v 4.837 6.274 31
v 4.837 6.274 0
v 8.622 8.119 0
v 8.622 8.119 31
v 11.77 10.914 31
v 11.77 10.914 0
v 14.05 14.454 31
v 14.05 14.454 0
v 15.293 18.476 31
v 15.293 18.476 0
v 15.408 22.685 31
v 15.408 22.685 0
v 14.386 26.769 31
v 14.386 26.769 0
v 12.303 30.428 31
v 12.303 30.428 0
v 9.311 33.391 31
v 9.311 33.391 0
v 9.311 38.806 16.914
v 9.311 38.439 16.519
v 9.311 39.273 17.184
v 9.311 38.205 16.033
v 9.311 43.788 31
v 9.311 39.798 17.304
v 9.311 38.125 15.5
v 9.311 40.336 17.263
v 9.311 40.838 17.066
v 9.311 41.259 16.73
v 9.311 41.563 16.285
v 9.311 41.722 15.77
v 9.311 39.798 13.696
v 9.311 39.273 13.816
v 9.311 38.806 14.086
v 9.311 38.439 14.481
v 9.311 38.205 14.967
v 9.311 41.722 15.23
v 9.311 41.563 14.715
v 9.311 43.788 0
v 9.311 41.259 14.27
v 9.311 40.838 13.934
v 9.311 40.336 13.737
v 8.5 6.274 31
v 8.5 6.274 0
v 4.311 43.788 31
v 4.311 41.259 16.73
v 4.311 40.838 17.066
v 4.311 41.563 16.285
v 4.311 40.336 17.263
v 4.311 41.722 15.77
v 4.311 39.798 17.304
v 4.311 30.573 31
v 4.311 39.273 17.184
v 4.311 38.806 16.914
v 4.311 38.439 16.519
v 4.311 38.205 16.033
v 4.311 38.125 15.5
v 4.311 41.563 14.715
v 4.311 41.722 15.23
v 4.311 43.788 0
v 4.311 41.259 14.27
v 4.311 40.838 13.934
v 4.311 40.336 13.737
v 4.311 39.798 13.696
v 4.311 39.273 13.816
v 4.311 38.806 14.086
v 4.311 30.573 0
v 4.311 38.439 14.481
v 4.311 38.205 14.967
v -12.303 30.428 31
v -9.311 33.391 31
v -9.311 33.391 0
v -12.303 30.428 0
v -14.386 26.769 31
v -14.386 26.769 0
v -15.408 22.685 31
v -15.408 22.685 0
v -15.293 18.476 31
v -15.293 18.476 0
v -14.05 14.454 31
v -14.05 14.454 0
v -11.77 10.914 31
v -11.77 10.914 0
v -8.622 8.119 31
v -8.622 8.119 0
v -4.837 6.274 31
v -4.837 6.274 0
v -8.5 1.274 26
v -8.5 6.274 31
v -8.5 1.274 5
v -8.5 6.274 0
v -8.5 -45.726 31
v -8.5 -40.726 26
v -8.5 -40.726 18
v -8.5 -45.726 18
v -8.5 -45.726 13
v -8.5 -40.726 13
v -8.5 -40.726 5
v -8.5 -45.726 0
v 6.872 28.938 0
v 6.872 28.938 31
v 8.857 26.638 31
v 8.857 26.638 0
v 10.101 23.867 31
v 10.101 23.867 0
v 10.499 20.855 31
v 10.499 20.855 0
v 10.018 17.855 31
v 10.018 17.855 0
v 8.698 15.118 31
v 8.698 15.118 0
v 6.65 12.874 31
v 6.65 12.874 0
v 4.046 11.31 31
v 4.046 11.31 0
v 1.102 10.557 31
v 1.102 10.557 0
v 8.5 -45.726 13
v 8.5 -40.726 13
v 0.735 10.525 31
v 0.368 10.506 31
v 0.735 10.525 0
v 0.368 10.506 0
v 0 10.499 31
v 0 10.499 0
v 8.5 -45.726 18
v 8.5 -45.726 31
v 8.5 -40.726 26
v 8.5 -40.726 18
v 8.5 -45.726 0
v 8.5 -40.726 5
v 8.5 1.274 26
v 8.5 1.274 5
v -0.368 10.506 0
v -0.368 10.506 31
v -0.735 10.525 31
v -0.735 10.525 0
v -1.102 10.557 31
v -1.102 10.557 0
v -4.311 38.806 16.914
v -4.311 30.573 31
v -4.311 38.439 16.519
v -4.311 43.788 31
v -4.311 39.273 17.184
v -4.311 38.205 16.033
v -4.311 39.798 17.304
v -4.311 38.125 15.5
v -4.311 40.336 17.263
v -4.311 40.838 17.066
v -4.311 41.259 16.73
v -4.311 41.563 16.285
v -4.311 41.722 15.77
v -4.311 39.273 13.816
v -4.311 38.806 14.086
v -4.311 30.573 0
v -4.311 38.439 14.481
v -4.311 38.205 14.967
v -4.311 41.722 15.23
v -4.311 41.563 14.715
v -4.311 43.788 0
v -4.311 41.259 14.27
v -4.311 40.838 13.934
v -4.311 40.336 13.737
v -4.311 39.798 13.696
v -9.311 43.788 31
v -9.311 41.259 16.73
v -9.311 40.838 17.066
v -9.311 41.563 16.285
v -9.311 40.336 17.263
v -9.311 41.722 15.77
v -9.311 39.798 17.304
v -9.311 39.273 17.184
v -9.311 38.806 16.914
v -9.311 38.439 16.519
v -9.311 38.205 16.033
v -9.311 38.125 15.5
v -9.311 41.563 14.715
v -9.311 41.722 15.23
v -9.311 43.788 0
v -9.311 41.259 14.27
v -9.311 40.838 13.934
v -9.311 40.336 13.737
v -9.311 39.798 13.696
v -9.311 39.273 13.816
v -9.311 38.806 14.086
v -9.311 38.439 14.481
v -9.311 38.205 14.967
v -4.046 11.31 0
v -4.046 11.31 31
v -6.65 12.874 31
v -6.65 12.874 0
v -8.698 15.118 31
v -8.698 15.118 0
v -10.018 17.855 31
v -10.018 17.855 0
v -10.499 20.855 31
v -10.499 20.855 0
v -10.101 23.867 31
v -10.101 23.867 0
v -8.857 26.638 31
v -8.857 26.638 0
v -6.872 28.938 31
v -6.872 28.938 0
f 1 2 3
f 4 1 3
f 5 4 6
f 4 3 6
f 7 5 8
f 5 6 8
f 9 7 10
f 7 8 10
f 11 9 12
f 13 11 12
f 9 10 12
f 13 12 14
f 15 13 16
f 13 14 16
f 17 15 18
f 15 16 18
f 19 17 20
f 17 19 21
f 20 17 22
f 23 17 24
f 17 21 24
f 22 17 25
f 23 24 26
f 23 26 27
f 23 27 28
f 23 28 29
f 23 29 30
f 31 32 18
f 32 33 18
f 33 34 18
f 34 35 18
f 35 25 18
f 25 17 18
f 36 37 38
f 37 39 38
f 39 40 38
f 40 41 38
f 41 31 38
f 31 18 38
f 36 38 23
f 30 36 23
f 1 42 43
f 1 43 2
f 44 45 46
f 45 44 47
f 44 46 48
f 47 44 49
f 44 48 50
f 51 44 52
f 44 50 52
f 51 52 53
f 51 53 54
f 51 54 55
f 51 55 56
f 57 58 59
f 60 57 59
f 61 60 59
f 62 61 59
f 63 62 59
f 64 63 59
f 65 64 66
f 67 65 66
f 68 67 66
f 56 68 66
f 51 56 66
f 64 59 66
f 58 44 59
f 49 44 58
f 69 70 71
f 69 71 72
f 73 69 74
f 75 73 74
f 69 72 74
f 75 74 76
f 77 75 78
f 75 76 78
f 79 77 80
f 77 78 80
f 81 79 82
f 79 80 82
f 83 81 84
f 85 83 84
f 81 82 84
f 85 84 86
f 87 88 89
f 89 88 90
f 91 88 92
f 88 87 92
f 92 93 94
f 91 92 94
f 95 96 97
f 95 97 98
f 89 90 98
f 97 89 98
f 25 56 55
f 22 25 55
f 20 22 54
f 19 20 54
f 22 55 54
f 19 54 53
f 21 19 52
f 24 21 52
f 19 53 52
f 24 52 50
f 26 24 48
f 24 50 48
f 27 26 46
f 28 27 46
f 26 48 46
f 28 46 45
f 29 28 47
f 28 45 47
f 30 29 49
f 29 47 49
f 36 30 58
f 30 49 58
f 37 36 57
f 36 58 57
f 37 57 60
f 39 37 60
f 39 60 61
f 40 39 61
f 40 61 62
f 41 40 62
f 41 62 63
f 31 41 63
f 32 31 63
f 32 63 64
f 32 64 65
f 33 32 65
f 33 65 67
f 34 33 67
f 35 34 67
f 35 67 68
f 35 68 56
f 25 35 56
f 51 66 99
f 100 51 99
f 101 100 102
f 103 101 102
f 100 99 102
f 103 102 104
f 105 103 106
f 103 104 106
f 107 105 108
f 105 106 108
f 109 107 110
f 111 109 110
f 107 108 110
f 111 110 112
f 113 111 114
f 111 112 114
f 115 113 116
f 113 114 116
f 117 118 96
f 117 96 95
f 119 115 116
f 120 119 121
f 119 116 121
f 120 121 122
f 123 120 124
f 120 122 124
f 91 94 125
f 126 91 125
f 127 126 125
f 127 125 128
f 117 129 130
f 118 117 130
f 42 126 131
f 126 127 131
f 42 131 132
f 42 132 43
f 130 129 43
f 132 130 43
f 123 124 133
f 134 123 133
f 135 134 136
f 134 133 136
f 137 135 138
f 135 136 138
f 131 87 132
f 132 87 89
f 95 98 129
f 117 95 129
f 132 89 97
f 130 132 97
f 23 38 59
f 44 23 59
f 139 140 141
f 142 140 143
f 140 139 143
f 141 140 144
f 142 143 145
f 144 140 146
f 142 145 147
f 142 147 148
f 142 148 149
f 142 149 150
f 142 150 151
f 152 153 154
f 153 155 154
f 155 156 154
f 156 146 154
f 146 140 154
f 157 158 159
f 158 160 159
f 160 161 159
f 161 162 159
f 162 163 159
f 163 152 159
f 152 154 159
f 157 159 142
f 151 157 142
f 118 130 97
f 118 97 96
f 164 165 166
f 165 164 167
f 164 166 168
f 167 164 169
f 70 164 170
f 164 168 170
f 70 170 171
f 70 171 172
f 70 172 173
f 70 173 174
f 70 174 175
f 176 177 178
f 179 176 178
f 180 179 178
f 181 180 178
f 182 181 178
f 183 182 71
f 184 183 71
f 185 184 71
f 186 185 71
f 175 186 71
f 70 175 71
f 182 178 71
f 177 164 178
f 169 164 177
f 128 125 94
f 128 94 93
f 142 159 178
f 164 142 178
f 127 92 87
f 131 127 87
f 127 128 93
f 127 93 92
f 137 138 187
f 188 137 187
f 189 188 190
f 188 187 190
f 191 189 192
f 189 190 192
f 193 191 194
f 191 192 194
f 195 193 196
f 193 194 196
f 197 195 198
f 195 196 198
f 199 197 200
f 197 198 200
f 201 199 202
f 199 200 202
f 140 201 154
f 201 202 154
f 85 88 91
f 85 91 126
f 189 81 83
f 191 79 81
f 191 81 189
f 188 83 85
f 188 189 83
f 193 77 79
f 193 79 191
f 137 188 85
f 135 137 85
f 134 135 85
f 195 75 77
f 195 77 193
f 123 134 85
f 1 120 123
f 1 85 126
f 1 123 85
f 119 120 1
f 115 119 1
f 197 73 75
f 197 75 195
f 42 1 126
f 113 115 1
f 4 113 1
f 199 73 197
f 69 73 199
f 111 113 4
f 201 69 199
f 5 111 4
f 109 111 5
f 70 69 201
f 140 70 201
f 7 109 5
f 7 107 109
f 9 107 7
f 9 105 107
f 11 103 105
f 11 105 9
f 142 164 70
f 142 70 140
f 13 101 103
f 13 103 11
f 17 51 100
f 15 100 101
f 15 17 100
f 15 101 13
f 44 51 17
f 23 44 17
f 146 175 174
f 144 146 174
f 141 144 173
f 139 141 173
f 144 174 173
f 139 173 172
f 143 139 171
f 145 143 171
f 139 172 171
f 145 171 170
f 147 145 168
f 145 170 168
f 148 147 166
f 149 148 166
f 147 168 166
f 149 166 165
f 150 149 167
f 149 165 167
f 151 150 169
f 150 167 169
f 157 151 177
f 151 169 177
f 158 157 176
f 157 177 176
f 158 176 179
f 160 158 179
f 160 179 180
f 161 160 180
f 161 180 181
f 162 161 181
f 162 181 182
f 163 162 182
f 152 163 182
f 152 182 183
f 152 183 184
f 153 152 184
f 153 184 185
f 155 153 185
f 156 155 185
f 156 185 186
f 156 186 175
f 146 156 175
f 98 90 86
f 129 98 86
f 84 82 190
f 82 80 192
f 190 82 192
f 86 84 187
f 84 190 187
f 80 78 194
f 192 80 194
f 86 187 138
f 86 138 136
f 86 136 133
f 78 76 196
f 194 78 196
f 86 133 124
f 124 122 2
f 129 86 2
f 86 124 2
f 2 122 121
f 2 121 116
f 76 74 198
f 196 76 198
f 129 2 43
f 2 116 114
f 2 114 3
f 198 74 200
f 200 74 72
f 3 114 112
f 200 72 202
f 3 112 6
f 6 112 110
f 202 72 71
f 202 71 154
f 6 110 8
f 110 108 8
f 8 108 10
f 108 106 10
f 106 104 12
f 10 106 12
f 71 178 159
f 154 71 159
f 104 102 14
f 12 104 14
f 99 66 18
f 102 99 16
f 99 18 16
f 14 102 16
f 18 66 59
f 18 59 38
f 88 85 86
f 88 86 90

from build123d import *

# Parameters (mm, degrees)
F1_DEPTH = 31
F2_R     = 1.808584
F3_DEPTH = 25
F5_DEPTH = 25


with BuildPart() as f1:
    # F0 (on Top) → F1 (new body)
    with BuildSketch(Plane.XY):
        with BuildLine():
            Line((-4.311411, 30.573439), (-4.311411, 43.788447))
            Line((-4.311411, 43.788447), (-9.311411, 43.788447))
            Line((-9.311411, 43.788447), (-9.311411, 33.390859))
            ThreePointArc((-9.311411, 33.390859), (-15.293246, 18.476209), (-4.837364, 6.273601))
            Line((-4.837364, 6.273601), (-8.5, 6.273601))
            Line((-8.5, 6.273601), (-8.5, -45.726399))
            Line((-8.5, -45.726399), (-7, -45.726399))
            Line((-7, -45.726399), (7, -45.726399))
            Line((7, -45.726399), (8.5, -45.726399))
            Line((8.5, -45.726399), (8.5, 6.273601))
            Line((8.5, 6.273601), (4.837364, 6.273601))
            ThreePointArc((4.837364, 6.273601), (15.293246, 18.476209), (9.311411, 33.390859))
            Line((9.311411, 33.390859), (9.311411, 43.788447))
            Line((9.311411, 43.788447), (4.311411, 43.788447))
            Line((4.311411, 43.788447), (4.311411, 30.573439))
            ThreePointArc((4.311411, 30.573439), (10.367578, 19.337097), (1.102061, 10.557421))
            ThreePointArc((1.102061, 10.557421), (0.551793, 10.513934), (0, 10.499425))
            ThreePointArc((0, 10.499425), (-0.551793, 10.513934), (-1.102061, 10.557421))
            ThreePointArc((-1.102061, 10.557421), (-10.367578, 19.337097), (-4.311411, 30.573439))
        make_face()
    extrude(amount=F1_DEPTH)

    # F2 (on face) → F3 (cut)
    with BuildSketch(Plane(origin=(-9.311411, 0, 0), x_dir=(0, -1, 0), z_dir=(-1, 0, 0))):
        with Locations((-39.933514, 15.5)):
            Circle(F2_R)
    extrude(amount=-F3_DEPTH, mode=Mode.SUBTRACT)

    # F4 (on face) → F5 (cut)
    with BuildSketch(Plane(origin=(-8.5, 0, 0), x_dir=(0, -1, 0), z_dir=(-1, 0, 0))):
        Polygon((40.726399, 5), (40.726399, 13), (45.726399, 13), (45.726399, 18), (40.726399, 18), (40.726399, 26), (-1.273601, 26), (-1.273601, 5), align=None)
    extrude(amount=-F5_DEPTH, mode=Mode.SUBTRACT)


solid = f1.part
